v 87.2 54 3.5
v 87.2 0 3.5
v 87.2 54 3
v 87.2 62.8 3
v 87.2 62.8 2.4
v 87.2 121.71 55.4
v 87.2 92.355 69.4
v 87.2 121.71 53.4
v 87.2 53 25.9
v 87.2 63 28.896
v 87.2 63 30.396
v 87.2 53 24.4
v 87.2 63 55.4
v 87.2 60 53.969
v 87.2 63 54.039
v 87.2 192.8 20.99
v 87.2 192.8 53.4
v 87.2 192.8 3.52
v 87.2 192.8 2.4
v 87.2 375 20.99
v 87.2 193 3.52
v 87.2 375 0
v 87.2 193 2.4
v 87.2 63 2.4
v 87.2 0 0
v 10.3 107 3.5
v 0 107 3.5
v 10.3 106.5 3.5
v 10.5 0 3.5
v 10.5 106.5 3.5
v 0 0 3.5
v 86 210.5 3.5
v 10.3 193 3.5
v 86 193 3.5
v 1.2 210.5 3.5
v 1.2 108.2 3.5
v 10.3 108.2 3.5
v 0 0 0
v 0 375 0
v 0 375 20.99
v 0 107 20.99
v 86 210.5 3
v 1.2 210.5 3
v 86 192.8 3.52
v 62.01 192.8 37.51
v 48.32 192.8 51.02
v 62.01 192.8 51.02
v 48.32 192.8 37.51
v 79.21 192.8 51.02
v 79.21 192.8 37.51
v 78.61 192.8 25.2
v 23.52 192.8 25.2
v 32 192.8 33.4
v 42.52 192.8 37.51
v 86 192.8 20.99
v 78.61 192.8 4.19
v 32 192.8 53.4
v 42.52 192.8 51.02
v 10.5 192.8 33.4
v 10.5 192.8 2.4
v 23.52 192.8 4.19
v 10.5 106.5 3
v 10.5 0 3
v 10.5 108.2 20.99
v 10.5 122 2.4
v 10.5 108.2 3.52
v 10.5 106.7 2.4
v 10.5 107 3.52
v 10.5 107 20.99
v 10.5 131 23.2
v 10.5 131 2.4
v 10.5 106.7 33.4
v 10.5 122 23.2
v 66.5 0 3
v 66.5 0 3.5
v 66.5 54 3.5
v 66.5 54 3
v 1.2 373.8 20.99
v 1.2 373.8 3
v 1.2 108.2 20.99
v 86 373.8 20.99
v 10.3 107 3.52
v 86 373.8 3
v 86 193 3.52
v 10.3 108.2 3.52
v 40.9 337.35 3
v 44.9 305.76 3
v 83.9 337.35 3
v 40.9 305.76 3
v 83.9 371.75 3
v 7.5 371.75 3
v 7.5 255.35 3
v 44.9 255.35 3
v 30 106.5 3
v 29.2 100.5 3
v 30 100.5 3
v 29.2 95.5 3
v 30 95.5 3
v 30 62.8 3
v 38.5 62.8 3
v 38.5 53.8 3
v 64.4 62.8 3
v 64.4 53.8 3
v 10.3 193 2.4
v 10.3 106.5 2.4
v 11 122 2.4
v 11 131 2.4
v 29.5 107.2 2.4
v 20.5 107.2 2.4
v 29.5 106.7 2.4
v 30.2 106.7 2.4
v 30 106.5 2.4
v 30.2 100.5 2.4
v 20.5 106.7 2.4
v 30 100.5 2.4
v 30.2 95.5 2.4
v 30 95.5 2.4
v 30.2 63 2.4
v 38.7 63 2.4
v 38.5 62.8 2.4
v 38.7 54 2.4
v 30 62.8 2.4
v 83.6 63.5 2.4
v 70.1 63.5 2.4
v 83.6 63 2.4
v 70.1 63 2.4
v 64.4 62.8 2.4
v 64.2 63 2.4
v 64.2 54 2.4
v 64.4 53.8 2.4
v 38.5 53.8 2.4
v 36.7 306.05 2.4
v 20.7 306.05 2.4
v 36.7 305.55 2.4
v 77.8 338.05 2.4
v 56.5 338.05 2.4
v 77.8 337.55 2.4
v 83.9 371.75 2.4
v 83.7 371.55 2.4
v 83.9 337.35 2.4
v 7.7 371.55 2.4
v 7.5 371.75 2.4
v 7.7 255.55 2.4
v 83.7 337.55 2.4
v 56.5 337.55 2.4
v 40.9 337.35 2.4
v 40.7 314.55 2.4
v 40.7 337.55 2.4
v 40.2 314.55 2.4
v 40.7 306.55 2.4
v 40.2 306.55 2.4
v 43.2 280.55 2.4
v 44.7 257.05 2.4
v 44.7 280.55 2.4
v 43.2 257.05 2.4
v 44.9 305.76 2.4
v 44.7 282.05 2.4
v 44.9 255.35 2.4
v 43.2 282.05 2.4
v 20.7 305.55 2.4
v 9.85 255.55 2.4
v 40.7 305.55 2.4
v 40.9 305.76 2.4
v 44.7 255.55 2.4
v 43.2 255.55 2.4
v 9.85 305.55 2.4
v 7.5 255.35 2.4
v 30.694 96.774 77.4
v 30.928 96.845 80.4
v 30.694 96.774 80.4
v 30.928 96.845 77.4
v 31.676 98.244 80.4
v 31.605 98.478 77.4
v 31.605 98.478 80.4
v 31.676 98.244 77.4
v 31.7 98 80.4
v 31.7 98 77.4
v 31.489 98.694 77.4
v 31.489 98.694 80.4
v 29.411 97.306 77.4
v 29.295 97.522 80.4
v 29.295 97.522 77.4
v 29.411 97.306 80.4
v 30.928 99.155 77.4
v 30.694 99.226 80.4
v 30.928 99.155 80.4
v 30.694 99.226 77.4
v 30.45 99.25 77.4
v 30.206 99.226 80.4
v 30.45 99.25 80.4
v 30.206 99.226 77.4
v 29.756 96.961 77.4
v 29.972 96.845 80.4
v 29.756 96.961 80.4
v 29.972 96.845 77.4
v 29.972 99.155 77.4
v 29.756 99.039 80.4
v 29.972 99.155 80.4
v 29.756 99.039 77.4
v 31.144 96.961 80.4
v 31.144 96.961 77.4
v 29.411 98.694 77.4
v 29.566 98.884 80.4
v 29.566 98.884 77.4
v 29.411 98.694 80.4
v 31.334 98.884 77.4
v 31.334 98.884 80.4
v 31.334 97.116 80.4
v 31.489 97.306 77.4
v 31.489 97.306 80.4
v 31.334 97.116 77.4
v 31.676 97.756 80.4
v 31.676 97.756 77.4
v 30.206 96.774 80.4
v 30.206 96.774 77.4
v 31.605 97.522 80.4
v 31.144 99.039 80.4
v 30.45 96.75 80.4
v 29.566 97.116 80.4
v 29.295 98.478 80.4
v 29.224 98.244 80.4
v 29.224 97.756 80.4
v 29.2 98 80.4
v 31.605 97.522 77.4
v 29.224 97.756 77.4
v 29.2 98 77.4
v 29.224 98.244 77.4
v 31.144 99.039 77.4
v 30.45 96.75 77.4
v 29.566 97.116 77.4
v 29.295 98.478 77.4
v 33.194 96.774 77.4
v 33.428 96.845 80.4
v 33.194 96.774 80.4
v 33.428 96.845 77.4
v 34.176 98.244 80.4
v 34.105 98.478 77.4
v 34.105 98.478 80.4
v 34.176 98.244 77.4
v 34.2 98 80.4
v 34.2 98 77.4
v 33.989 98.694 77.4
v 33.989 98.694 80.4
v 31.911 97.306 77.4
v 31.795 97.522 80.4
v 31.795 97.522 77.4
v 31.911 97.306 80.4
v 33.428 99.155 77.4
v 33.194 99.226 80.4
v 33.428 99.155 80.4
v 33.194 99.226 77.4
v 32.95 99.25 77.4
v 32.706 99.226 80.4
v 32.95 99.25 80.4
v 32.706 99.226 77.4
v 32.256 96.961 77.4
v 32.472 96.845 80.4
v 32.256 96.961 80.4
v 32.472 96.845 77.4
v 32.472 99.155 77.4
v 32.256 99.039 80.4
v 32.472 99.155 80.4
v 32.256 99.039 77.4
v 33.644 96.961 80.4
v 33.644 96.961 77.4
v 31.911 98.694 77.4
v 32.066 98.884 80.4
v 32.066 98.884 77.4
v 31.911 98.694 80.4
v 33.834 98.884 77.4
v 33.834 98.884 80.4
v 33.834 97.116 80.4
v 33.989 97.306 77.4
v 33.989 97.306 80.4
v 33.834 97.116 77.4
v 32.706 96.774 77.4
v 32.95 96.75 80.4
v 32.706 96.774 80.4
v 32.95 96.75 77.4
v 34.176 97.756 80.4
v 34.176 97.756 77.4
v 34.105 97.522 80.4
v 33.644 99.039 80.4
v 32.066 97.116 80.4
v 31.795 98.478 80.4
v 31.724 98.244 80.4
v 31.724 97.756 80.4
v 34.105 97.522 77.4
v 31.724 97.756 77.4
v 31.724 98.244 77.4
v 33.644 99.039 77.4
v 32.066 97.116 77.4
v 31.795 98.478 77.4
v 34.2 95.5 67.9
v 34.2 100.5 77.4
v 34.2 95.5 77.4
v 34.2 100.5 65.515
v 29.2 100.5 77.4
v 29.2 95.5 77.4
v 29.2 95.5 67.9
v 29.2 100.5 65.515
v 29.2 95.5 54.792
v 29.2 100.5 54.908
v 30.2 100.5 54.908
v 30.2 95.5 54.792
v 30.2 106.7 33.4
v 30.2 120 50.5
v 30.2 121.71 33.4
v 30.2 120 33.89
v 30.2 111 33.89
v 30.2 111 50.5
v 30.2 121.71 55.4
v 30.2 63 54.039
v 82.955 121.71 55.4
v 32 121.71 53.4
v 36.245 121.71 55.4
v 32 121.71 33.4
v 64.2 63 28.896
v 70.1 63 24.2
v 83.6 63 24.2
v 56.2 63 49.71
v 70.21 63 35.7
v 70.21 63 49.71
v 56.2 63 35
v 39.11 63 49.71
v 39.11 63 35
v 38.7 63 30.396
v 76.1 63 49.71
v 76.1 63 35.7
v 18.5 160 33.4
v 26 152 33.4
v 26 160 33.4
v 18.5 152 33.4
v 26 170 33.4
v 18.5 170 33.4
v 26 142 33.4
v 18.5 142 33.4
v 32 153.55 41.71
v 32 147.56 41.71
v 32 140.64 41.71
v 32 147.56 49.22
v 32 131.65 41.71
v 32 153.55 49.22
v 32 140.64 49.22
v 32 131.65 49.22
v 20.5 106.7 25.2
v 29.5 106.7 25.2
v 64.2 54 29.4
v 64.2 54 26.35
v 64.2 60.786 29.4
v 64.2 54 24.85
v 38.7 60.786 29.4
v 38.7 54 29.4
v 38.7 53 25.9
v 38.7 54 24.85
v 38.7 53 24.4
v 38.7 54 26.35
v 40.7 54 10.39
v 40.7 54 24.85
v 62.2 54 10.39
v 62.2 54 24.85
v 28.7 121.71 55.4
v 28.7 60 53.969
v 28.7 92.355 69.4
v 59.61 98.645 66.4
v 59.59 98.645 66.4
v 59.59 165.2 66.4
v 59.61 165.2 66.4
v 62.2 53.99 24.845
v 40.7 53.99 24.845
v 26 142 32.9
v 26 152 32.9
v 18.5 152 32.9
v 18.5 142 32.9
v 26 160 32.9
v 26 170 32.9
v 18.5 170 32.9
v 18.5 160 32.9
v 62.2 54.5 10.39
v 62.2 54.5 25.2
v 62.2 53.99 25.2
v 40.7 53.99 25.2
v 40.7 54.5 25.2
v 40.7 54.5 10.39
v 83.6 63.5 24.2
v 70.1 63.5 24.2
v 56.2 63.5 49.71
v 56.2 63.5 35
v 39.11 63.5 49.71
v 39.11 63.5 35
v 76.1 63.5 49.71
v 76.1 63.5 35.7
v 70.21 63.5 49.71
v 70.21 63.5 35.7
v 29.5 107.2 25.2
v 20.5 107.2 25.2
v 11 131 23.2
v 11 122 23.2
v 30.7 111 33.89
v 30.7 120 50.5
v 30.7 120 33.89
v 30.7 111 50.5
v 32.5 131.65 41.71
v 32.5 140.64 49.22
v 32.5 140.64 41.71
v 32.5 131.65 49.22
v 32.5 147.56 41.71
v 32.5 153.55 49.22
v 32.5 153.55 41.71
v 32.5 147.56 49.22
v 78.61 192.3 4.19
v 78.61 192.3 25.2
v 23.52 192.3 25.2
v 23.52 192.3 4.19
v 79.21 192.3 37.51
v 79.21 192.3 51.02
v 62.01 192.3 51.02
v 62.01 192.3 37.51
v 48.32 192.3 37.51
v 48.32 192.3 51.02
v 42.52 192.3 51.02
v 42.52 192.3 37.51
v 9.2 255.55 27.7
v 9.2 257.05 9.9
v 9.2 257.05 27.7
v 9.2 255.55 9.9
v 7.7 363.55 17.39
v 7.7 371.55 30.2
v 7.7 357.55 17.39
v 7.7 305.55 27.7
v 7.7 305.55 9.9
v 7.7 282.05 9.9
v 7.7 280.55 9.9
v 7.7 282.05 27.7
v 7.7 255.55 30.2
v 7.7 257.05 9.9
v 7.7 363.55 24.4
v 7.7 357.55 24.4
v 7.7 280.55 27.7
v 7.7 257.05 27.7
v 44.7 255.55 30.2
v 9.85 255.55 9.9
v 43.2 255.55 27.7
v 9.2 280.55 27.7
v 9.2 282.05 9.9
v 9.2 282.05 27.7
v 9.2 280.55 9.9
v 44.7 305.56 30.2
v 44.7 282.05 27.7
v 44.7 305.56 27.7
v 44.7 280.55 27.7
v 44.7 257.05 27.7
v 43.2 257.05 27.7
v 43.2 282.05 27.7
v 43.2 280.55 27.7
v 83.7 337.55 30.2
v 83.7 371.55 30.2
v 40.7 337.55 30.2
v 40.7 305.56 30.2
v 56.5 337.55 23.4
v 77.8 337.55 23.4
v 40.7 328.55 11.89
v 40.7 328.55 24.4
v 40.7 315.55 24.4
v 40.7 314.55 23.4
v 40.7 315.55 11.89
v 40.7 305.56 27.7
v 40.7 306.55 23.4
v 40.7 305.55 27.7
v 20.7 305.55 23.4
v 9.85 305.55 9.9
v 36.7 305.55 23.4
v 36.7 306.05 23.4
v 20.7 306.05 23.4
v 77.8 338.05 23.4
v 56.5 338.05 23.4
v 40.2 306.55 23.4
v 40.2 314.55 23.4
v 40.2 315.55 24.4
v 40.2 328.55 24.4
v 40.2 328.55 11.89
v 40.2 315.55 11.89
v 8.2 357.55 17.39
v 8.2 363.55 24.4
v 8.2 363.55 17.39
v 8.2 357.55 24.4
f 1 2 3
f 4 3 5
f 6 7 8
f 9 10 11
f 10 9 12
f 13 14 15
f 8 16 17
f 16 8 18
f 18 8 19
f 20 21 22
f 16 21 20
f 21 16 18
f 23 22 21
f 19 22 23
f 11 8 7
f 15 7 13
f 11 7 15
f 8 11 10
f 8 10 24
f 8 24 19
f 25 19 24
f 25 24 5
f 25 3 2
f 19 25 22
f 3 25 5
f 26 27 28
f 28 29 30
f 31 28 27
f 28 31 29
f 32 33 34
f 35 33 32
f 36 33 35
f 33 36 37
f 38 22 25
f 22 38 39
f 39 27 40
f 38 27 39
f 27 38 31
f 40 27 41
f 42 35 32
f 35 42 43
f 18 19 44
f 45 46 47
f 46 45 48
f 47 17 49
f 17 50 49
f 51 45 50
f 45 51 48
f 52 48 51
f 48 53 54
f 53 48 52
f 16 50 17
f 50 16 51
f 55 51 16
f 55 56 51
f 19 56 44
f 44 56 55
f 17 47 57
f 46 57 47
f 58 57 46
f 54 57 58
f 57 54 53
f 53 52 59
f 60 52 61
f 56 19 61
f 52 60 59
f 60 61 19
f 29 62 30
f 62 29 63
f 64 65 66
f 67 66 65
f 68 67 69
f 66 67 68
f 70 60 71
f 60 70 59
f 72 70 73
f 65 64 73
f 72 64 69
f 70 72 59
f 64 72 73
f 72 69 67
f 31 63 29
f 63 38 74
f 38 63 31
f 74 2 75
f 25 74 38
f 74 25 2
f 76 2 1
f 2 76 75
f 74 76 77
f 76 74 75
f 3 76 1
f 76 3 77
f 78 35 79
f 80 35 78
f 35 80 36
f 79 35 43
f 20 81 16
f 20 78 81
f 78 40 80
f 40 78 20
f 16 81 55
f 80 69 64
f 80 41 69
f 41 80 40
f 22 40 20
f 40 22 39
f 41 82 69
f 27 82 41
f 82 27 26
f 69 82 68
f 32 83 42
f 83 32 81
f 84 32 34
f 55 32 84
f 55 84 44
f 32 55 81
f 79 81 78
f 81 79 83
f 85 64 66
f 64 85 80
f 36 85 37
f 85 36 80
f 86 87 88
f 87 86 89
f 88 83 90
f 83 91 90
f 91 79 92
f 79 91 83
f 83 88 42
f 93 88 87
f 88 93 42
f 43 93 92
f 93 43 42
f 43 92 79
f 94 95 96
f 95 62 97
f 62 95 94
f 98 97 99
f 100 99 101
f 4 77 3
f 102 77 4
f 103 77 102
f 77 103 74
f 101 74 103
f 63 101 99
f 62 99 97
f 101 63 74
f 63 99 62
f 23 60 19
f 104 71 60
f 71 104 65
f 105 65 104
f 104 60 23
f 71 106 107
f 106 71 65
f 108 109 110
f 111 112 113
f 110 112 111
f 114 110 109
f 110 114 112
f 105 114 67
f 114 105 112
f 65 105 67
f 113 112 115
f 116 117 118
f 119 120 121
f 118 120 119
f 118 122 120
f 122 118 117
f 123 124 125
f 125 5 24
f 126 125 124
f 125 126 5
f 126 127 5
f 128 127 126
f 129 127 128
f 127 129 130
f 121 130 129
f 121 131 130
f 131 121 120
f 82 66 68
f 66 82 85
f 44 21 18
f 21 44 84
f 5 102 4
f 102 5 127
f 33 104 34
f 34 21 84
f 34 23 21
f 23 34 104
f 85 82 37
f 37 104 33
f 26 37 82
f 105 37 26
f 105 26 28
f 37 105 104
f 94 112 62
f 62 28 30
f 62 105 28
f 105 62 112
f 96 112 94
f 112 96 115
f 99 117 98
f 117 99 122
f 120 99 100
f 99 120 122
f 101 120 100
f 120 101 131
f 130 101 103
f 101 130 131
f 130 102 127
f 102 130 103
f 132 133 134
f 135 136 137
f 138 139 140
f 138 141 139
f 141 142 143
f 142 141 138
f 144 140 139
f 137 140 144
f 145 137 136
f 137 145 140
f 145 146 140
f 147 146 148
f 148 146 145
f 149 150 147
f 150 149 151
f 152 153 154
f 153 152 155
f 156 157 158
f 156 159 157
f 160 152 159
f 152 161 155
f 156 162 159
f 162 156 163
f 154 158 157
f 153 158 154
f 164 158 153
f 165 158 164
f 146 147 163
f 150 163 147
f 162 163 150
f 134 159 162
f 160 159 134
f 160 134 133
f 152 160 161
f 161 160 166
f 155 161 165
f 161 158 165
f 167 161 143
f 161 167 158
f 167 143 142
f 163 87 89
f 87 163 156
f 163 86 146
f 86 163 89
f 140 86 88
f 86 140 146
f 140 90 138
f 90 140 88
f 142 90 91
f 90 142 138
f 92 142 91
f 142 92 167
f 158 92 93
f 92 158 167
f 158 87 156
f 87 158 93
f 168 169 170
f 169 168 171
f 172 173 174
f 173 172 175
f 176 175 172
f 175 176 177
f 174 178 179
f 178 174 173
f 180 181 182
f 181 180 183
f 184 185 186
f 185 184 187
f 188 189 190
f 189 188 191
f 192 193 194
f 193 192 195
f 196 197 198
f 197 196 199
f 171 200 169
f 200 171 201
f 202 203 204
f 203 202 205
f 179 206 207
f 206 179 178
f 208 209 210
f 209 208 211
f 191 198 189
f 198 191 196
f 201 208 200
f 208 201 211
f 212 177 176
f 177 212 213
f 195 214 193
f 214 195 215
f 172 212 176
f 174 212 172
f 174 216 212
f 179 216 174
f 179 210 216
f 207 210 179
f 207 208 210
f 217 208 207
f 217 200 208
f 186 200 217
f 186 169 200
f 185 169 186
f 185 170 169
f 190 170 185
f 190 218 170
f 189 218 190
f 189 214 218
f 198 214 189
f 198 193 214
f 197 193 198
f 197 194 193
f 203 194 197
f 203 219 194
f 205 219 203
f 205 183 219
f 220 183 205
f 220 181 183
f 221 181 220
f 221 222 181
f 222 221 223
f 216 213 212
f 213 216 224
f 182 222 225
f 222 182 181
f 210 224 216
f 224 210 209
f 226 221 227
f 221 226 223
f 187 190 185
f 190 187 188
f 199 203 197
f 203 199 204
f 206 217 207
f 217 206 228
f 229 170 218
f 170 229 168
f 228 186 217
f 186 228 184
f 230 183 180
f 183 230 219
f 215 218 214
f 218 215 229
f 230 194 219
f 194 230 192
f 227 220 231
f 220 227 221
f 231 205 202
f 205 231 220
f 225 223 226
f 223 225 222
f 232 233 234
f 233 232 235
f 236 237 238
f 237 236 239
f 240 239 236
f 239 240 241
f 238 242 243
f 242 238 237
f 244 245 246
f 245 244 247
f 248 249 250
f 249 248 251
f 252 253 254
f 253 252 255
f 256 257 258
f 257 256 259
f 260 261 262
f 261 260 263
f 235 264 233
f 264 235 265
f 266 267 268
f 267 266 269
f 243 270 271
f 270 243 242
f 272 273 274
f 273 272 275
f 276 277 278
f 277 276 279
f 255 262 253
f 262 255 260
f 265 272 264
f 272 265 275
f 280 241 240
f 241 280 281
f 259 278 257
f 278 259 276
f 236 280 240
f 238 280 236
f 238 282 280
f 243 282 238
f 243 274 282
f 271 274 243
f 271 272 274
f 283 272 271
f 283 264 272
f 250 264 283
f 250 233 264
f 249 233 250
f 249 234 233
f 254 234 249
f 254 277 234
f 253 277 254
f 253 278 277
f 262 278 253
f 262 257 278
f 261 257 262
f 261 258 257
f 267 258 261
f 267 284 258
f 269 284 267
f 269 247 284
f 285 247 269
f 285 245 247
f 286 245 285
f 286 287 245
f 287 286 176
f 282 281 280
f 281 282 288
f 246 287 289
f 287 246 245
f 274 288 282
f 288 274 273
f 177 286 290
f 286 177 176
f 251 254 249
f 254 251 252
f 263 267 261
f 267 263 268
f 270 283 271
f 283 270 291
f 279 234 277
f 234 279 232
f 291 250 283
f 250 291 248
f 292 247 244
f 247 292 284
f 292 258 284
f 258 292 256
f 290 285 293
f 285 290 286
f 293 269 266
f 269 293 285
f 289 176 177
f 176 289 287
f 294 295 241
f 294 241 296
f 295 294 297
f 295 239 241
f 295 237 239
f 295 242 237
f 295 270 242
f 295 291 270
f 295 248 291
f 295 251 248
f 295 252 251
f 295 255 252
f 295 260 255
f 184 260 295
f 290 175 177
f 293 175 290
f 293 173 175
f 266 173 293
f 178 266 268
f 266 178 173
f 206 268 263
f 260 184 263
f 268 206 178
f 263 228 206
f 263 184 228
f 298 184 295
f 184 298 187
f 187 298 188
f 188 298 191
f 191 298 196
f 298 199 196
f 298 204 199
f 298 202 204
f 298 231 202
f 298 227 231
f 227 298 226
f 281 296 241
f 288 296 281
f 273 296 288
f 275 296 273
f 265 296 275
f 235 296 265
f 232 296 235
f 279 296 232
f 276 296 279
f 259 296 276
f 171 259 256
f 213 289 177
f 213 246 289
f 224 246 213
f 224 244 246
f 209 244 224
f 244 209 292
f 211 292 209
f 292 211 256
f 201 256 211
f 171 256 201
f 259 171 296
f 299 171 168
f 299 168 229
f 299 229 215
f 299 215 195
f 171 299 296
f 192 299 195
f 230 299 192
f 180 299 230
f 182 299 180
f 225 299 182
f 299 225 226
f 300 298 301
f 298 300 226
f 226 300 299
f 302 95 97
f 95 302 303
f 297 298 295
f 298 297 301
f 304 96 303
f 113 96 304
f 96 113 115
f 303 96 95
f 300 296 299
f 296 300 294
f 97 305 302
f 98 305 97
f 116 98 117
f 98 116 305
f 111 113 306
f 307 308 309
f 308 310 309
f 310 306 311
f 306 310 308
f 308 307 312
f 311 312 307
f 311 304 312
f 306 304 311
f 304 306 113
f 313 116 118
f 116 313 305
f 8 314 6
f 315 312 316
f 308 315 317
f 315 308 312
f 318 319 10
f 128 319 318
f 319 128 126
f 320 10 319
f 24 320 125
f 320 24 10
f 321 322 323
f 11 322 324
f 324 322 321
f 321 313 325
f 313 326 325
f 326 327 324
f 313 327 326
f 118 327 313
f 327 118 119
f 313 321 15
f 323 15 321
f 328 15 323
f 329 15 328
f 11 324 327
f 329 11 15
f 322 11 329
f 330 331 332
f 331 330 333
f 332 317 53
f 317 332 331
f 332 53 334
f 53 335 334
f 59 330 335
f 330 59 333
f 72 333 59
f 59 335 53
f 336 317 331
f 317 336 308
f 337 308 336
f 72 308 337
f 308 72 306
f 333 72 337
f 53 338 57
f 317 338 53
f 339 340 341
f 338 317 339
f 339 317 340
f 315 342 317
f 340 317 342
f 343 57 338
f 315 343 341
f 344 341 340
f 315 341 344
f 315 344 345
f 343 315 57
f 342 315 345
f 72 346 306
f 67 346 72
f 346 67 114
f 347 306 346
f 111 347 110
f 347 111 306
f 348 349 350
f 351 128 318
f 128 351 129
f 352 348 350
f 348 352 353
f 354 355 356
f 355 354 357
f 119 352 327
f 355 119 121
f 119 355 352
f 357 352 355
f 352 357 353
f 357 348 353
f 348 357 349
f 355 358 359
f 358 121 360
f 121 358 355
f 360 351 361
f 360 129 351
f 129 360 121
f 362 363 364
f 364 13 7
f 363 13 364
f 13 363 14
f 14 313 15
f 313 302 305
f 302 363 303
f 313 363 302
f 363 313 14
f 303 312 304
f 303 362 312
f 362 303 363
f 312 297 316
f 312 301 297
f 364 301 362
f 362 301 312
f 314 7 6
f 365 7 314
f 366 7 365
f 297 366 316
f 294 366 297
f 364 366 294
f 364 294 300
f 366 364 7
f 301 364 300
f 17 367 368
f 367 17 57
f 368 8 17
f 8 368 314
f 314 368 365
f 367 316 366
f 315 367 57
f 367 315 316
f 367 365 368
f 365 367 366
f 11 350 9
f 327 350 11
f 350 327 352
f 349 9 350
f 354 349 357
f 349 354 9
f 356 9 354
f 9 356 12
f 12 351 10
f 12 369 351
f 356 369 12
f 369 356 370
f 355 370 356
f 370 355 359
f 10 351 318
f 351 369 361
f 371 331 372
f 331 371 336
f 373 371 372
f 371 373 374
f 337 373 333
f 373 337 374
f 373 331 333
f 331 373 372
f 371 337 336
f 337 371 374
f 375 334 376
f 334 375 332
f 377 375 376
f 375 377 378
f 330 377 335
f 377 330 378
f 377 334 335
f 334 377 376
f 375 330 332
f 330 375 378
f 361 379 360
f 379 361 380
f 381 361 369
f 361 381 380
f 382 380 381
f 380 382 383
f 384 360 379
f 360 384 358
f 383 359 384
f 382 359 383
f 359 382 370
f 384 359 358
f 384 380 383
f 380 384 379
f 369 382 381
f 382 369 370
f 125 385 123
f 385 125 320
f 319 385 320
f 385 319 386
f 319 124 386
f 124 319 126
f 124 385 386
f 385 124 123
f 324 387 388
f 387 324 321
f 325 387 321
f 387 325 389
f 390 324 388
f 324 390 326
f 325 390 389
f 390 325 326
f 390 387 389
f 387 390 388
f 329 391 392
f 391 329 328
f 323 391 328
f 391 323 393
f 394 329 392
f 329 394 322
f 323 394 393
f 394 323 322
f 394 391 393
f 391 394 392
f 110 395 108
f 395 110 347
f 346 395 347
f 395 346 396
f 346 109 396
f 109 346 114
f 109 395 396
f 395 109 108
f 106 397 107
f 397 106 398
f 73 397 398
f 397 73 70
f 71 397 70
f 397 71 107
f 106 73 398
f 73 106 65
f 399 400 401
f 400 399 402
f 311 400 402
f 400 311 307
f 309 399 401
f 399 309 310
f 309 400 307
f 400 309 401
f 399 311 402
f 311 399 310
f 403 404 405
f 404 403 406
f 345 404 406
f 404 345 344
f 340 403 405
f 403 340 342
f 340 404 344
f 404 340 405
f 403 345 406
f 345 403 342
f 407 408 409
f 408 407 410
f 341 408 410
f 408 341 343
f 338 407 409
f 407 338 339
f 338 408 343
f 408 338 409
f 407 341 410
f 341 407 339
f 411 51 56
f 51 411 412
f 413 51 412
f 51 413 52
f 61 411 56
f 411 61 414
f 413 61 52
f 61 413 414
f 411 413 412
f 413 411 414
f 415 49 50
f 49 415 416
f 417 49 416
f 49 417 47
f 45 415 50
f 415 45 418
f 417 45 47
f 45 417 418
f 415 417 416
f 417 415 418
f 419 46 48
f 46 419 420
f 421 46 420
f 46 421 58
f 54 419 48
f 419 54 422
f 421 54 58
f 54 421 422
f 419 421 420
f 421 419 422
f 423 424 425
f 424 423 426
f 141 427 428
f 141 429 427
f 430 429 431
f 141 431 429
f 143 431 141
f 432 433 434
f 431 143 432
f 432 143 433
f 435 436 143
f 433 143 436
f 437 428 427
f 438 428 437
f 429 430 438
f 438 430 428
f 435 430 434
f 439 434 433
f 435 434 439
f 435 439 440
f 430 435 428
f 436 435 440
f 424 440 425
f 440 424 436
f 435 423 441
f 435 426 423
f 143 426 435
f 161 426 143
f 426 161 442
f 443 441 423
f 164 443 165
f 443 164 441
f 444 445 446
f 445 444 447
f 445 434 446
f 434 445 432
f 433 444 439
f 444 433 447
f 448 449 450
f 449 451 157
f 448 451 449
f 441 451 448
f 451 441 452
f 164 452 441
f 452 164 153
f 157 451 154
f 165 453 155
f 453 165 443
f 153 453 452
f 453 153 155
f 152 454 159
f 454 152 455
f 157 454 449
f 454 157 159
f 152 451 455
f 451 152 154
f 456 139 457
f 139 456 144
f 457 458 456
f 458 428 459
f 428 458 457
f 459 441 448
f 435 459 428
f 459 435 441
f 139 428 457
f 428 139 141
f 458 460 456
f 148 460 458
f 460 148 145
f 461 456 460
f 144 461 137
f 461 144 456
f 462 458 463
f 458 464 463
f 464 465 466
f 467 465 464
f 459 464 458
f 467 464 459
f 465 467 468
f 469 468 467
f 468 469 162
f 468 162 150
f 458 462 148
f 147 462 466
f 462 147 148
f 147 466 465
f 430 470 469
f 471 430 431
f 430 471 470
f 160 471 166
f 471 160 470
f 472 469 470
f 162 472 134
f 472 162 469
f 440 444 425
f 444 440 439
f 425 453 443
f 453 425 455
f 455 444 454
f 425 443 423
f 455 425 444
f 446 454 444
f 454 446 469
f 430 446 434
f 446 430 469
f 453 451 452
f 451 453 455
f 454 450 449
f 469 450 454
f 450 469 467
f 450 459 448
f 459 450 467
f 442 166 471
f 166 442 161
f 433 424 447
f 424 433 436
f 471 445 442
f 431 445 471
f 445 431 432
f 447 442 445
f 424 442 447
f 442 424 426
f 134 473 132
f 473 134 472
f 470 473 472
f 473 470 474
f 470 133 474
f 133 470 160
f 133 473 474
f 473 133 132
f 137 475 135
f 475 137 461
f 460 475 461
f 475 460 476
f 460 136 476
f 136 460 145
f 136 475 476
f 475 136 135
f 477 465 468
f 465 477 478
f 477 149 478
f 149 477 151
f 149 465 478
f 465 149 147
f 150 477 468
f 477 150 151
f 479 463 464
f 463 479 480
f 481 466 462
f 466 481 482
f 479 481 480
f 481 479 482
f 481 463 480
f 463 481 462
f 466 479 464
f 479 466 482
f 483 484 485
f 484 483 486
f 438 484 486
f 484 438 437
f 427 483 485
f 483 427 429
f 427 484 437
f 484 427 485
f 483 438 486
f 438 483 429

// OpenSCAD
// file: _home_model.scad
// =====================================
// Home massing model
// 1:100 printable massing model of a two-storey semi with rear and side
// extensions, its plot and the garden room, from the architect's 1:50
// drawings. All figures below are real millimetres.
// =====================================
// Parts:
//   home_house        -> home_house.stl        house, roofs, bay, canopy, chimney
//   home_garden_room  -> home_garden_room.stl  L-shaped shower/office/workshop
//   home_site_front   -> home_site_front.stl   front plot tile (Y up to 15000)
//   home_site_rear    -> home_site_rear.stl    rear plot tile (Y from 15000)
//   home_assembly     -> home_assembly.stl     viewing aid, not a printable part
//
// Site frame: X east (party wall side), Y towards the rear garden, Z up;
// X = 0 at the west face of the rear extension, Y = 0 at the main house
// front face. scale_denominator divides everything at the end.

$fn = 64;

scale_denominator = 100;
s = 1 / scale_denominator;

// Print-size features (printed mm x scale_denominator)
base_t    = 3   * scale_denominator;
recess_d  = 0.6 * scale_denominator;
relief_h  = 0.5 * scale_denominator;
opening_d = 0.5 * scale_denominator;
fence_t   = 1.2 * scale_denominator;
fit_clear = 0.2 * scale_denominator;
eps = 1;

// Plot
plot_x0 = -1050;  plot_x1 =  7670;  plot_y0 = -6300;  plot_y1 = 31200;
tile_split_y = 15000;
patio_y0 = 12980;  patio_y1 = 14750;  drive_x0 = 5600;
fence_h  = 1800;  fence_y0 = 4400;  east_fence_y0 = 12980;

// Main house
main_x0 = 1970;  main_x1 = 7670;  main_y0 = 0;  main_y1 = 5871;
main_eaves_h = 5300;  main_ridge_h = 6700;  main_ridge_y = (main_y0 + main_y1) / 2;
front_overhang = 300;  verge_overhang = 150;
bay_x0 = 2820;  bay_x1 = 5370;  bay_proj = 900;  bay_h = 2700;
canopy_y = -1000;  canopy_z0 = 2350;  canopy_z1 = 2800;  canopy_t = 150;

// Rear extension and first-floor rear block
rear_x0 = 0;  rear_x1 = 7670;  rear_y0 = main_y1;  rear_y1 = 12980;
ff_x0 = 2150;  ff_x1 = 7670;  rear_eaves_h = 5100;  rear_ridge_h = 6400;
rear_ridge_x = (ff_x0 + ff_x1) / 2;  hip_len = (ff_x1 - ff_x0) / 2;
side_x0 = 0;  side_x1 = main_x0;  side_y0 = 4370;  side_y1 = main_y1;
flat_h = 3100;
chim_x0 = 1870;  chim_x1 = 2370;  chim_y0 = 3250;  chim_y1 = 3750;  chim_h = 7500;
pot_d = 250;  pot_h = 300;
rooflight_x0 = 800;  rooflight_x1 = 1550;  rooflight_y = [7900, 9700];  rooflight_l = 1000;  rooflight_d = 50;

// Garden room
gr_x0 = -280;  gr_x1 = 7320;  gr_y1 = 30855;  gr_north_y0 = gr_y1 - 3400;
gr_west_x1 = 3020;  gr_west_y0 = gr_north_y0 - 3200;
gr_wall_h = 2530;  gr_roof_t = 250;  gr_h = gr_wall_h + gr_roof_t;
cov_x1 = 3420;  cov_y0 = gr_west_y0 - 5000;
post_w = 150;  low_wall_t = 215;  low_wall_h = 750;

module box(x0, x1, y0, y1, z0, z1) { translate([x0, y0, z0]) cube([x1 - x0, y1 - y0, z1 - z0]); }
module cut_south(y, x0, x1, z0, z1) { box(x0, x1, y - eps, y + opening_d, z0 - eps, z1); }
module cut_north(y, x0, x1, z0, z1) { box(x0, x1, y - opening_d, y + eps, z0 - eps, z1); }
module cut_west(x, y0, y1, z0, z1)  { box(x - eps, x + opening_d, y0, y1, z0 - eps, z1); }
module cut_east(x, y0, y1, z0, z1)  { box(x - opening_d, x + eps, y0, y1, z0 - eps, z1); }
module yz_prism(x0, x1, pts) { translate([x0, 0, 0]) rotate([90, 0, 90]) linear_extrude(x1 - x0) polygon(pts); }

module main_roof() {
    k = (main_ridge_h - main_eaves_h) / (main_ridge_y - main_y0);
    yz_prism(main_x0 - verge_overhang, main_x1, [
        [main_y0 - front_overhang, main_eaves_h - front_overhang * k],
        [main_ridge_y, main_ridge_h], [main_y1, main_eaves_h]]);
}
// Hip prism starts under the main ridge so the union forms the valleys.
module rear_roof() {
    hull() {
        box(ff_x0, ff_x1, main_ridge_y, rear_y1, rear_eaves_h - eps, rear_eaves_h);
        box(rear_ridge_x - 1, rear_ridge_x + 1, main_ridge_y, rear_y1 - hip_len, rear_ridge_h - 1, rear_ridge_h);
    }
}
module canopy() {
    yz_prism(bay_x0, main_x1, [[canopy_y, canopy_z0], [eps, canopy_z1],
        [eps, canopy_z1 - canopy_t], [canopy_y, canopy_z0 - canopy_t]]);
}
module chimney() {
    box(chim_x0, chim_x1, chim_y0, chim_y1, 0, chim_h);
    for (x = [chim_x0 + 125, chim_x1 - 125])
        translate([x, (chim_y0 + chim_y1) / 2, chim_h - eps]) cylinder(d = pot_d, h = pot_h + eps);
}
module house_real() {
    difference() {
        union() {
            box(main_x0, main_x1, main_y0, main_y1, 0, main_eaves_h);
            box(rear_x0, rear_x1, rear_y0 - eps, rear_y1, 0, flat_h);
            box(ff_x0, ff_x1, rear_y0 - eps, rear_y1, 0, rear_eaves_h);
            box(side_x0, side_x1 + eps, side_y0, side_y1 + eps, 0, flat_h);
            box(bay_x0, bay_x1, -bay_proj, eps, 0, bay_h);
            main_roof(); rear_roof(); canopy(); chimney();
        }
        cut_south(-bay_proj, 3020, 5170, 800, 2280);      // bay window
        cut_south(main_y0, 5960, 7310, 0, 2180);          // front door + side light
        cut_south(main_y0, 2861, 4570, 3261, 4731);       // FF window west
        cut_south(main_y0, 5971, 6560, 3331, 4731);       // FF window over door
        cut_south(side_y0, 1000, 1900, 0, 2280);          // side extension door
        cut_west(rear_x0, 5900, 6800, 0, 2080);           // kitchen strip door
        cut_west(main_x0, 4800, 5700, flat_h + 50, 4810); // FF escape window
        cut_west(ff_x0, 6865, 7764, 3932, 4682);          // bath
        cut_west(ff_x0, 8456, 9055, 3932, 4682);          // en-suite
        cut_north(rear_y1, 1302, 6811, 180, 2280);        // sliding doors
        cut_north(rear_y1, 5151, 6871, 3512, 4862);       // principal bed window
        cut_north(rear_y1, 3202, 3782, 3512, 4862);       // dressing window
        for (y = rooflight_y) box(rooflight_x0, rooflight_x1, y, y + rooflight_l, flat_h - rooflight_d, flat_h + eps);
    }
}
module garden_room_real() {
    difference() {
        union() {
            box(gr_x0, gr_x1, gr_north_y0, gr_y1, 0, gr_h);
            box(gr_x0, gr_west_x1, gr_west_y0, gr_north_y0 + eps, 0, gr_h);
            box(gr_x0, cov_x1, cov_y0, gr_west_y0 + eps, gr_wall_h, gr_h);
            for (x = [gr_x0, cov_x1 - post_w], y = [cov_y0, (cov_y0 + gr_west_y0) / 2])
                box(x, x + post_w, y, y + post_w, 0, gr_wall_h + eps);
            box(gr_x0, gr_x0 + low_wall_t, cov_y0, gr_west_y0 + eps, 0, low_wall_h);
        }
        cut_south(gr_west_y0, 1020, 2620, 0, 2100);   // office doors to covered area
        cut_south(gr_north_y0, 4600, 6730, 0, 2100);  // workshop double door
        cut_east(gr_west_x1, 24355, 25155, 0, 2100);  // office door
        cut_east(gr_west_x1, 25255, 26555, 950, 2200);// office window
        cut_west(gr_x0, 29455, 30055, 1500, 2200);    // shower window
    }
}
module house_footprint_2d() {
    translate([main_x0, main_y0]) square([main_x1 - main_x0, main_y1 - main_y0]);
    translate([bay_x0, -bay_proj]) square([bay_x1 - bay_x0, bay_proj + eps]);
    translate([rear_x0, rear_y0 - eps]) square([rear_x1 - rear_x0, rear_y1 - rear_y0 + eps]);
    translate([side_x0, side_y0]) square([side_x1 - side_x0 + eps, side_y1 - side_y0 + eps]);
}
module garden_room_footprint_2d() {
    translate([gr_x0, gr_north_y0]) square([gr_x1 - gr_x0, gr_y1 - gr_north_y0]);
    translate([gr_x0, gr_west_y0]) square([gr_west_x1 - gr_x0, gr_north_y0 - gr_west_y0 + eps]);
    translate([gr_x0, cov_y0]) square([cov_x1 - gr_x0, gr_west_y0 - cov_y0 + eps]);
}
module fences() {
    box(plot_x0, plot_x0 + fence_t, fence_y0, plot_y1, 0, fence_h);
    box(plot_x1 - fence_t, plot_x1, east_fence_y0, plot_y1, 0, fence_h);
    box(plot_x0, plot_x1, plot_y1 - fence_t, plot_y1, 0, fence_h);
    box(plot_x0, 0, fence_y0, fence_y0 + fence_t, 0, fence_h);
}
module relief() {
    box(plot_x0, plot_x1, patio_y0, patio_y1, 0, base_t + relief_h);
    box(plot_x0, 0, plot_y0, rear_y1, 0, base_t + relief_h);
    box(drive_x0, plot_x1, plot_y0, -bay_proj, 0, base_t + relief_h);
}
module tile_real(y0, y1) {
    difference() {
        union() {
            box(plot_x0, plot_x1, y0, y1, 0, base_t);
            intersection() { box(plot_x0, plot_x1, y0, y1, 0, base_t + relief_h + eps); relief(); }
            intersection() { box(plot_x0, plot_x1, y0, y1, 0, base_t + fence_h + eps); translate([0, 0, base_t - eps]) fences(); }
        }
        translate([0, 0, base_t - recess_d]) linear_extrude(recess_d + relief_h + 2 * eps)
            offset(delta = fit_clear) { house_footprint_2d(); garden_room_footprint_2d(); }
    }
}
module site_front_real() { tile_real(plot_y0, tile_split_y); }
module site_rear_real()  { tile_real(tile_split_y, plot_y1); }
module home_assembly_real() {
    site_front_real(); site_rear_real();
    translate([0, 0, base_t - recess_d]) { house_real(); garden_room_real(); }
}
// main file
include <_home_model.scad>

// Viewing aid, not a printable part.
$fn = 32;
scale(s) translate([-plot_x0, -plot_y0, 0]) home_assembly_real();
